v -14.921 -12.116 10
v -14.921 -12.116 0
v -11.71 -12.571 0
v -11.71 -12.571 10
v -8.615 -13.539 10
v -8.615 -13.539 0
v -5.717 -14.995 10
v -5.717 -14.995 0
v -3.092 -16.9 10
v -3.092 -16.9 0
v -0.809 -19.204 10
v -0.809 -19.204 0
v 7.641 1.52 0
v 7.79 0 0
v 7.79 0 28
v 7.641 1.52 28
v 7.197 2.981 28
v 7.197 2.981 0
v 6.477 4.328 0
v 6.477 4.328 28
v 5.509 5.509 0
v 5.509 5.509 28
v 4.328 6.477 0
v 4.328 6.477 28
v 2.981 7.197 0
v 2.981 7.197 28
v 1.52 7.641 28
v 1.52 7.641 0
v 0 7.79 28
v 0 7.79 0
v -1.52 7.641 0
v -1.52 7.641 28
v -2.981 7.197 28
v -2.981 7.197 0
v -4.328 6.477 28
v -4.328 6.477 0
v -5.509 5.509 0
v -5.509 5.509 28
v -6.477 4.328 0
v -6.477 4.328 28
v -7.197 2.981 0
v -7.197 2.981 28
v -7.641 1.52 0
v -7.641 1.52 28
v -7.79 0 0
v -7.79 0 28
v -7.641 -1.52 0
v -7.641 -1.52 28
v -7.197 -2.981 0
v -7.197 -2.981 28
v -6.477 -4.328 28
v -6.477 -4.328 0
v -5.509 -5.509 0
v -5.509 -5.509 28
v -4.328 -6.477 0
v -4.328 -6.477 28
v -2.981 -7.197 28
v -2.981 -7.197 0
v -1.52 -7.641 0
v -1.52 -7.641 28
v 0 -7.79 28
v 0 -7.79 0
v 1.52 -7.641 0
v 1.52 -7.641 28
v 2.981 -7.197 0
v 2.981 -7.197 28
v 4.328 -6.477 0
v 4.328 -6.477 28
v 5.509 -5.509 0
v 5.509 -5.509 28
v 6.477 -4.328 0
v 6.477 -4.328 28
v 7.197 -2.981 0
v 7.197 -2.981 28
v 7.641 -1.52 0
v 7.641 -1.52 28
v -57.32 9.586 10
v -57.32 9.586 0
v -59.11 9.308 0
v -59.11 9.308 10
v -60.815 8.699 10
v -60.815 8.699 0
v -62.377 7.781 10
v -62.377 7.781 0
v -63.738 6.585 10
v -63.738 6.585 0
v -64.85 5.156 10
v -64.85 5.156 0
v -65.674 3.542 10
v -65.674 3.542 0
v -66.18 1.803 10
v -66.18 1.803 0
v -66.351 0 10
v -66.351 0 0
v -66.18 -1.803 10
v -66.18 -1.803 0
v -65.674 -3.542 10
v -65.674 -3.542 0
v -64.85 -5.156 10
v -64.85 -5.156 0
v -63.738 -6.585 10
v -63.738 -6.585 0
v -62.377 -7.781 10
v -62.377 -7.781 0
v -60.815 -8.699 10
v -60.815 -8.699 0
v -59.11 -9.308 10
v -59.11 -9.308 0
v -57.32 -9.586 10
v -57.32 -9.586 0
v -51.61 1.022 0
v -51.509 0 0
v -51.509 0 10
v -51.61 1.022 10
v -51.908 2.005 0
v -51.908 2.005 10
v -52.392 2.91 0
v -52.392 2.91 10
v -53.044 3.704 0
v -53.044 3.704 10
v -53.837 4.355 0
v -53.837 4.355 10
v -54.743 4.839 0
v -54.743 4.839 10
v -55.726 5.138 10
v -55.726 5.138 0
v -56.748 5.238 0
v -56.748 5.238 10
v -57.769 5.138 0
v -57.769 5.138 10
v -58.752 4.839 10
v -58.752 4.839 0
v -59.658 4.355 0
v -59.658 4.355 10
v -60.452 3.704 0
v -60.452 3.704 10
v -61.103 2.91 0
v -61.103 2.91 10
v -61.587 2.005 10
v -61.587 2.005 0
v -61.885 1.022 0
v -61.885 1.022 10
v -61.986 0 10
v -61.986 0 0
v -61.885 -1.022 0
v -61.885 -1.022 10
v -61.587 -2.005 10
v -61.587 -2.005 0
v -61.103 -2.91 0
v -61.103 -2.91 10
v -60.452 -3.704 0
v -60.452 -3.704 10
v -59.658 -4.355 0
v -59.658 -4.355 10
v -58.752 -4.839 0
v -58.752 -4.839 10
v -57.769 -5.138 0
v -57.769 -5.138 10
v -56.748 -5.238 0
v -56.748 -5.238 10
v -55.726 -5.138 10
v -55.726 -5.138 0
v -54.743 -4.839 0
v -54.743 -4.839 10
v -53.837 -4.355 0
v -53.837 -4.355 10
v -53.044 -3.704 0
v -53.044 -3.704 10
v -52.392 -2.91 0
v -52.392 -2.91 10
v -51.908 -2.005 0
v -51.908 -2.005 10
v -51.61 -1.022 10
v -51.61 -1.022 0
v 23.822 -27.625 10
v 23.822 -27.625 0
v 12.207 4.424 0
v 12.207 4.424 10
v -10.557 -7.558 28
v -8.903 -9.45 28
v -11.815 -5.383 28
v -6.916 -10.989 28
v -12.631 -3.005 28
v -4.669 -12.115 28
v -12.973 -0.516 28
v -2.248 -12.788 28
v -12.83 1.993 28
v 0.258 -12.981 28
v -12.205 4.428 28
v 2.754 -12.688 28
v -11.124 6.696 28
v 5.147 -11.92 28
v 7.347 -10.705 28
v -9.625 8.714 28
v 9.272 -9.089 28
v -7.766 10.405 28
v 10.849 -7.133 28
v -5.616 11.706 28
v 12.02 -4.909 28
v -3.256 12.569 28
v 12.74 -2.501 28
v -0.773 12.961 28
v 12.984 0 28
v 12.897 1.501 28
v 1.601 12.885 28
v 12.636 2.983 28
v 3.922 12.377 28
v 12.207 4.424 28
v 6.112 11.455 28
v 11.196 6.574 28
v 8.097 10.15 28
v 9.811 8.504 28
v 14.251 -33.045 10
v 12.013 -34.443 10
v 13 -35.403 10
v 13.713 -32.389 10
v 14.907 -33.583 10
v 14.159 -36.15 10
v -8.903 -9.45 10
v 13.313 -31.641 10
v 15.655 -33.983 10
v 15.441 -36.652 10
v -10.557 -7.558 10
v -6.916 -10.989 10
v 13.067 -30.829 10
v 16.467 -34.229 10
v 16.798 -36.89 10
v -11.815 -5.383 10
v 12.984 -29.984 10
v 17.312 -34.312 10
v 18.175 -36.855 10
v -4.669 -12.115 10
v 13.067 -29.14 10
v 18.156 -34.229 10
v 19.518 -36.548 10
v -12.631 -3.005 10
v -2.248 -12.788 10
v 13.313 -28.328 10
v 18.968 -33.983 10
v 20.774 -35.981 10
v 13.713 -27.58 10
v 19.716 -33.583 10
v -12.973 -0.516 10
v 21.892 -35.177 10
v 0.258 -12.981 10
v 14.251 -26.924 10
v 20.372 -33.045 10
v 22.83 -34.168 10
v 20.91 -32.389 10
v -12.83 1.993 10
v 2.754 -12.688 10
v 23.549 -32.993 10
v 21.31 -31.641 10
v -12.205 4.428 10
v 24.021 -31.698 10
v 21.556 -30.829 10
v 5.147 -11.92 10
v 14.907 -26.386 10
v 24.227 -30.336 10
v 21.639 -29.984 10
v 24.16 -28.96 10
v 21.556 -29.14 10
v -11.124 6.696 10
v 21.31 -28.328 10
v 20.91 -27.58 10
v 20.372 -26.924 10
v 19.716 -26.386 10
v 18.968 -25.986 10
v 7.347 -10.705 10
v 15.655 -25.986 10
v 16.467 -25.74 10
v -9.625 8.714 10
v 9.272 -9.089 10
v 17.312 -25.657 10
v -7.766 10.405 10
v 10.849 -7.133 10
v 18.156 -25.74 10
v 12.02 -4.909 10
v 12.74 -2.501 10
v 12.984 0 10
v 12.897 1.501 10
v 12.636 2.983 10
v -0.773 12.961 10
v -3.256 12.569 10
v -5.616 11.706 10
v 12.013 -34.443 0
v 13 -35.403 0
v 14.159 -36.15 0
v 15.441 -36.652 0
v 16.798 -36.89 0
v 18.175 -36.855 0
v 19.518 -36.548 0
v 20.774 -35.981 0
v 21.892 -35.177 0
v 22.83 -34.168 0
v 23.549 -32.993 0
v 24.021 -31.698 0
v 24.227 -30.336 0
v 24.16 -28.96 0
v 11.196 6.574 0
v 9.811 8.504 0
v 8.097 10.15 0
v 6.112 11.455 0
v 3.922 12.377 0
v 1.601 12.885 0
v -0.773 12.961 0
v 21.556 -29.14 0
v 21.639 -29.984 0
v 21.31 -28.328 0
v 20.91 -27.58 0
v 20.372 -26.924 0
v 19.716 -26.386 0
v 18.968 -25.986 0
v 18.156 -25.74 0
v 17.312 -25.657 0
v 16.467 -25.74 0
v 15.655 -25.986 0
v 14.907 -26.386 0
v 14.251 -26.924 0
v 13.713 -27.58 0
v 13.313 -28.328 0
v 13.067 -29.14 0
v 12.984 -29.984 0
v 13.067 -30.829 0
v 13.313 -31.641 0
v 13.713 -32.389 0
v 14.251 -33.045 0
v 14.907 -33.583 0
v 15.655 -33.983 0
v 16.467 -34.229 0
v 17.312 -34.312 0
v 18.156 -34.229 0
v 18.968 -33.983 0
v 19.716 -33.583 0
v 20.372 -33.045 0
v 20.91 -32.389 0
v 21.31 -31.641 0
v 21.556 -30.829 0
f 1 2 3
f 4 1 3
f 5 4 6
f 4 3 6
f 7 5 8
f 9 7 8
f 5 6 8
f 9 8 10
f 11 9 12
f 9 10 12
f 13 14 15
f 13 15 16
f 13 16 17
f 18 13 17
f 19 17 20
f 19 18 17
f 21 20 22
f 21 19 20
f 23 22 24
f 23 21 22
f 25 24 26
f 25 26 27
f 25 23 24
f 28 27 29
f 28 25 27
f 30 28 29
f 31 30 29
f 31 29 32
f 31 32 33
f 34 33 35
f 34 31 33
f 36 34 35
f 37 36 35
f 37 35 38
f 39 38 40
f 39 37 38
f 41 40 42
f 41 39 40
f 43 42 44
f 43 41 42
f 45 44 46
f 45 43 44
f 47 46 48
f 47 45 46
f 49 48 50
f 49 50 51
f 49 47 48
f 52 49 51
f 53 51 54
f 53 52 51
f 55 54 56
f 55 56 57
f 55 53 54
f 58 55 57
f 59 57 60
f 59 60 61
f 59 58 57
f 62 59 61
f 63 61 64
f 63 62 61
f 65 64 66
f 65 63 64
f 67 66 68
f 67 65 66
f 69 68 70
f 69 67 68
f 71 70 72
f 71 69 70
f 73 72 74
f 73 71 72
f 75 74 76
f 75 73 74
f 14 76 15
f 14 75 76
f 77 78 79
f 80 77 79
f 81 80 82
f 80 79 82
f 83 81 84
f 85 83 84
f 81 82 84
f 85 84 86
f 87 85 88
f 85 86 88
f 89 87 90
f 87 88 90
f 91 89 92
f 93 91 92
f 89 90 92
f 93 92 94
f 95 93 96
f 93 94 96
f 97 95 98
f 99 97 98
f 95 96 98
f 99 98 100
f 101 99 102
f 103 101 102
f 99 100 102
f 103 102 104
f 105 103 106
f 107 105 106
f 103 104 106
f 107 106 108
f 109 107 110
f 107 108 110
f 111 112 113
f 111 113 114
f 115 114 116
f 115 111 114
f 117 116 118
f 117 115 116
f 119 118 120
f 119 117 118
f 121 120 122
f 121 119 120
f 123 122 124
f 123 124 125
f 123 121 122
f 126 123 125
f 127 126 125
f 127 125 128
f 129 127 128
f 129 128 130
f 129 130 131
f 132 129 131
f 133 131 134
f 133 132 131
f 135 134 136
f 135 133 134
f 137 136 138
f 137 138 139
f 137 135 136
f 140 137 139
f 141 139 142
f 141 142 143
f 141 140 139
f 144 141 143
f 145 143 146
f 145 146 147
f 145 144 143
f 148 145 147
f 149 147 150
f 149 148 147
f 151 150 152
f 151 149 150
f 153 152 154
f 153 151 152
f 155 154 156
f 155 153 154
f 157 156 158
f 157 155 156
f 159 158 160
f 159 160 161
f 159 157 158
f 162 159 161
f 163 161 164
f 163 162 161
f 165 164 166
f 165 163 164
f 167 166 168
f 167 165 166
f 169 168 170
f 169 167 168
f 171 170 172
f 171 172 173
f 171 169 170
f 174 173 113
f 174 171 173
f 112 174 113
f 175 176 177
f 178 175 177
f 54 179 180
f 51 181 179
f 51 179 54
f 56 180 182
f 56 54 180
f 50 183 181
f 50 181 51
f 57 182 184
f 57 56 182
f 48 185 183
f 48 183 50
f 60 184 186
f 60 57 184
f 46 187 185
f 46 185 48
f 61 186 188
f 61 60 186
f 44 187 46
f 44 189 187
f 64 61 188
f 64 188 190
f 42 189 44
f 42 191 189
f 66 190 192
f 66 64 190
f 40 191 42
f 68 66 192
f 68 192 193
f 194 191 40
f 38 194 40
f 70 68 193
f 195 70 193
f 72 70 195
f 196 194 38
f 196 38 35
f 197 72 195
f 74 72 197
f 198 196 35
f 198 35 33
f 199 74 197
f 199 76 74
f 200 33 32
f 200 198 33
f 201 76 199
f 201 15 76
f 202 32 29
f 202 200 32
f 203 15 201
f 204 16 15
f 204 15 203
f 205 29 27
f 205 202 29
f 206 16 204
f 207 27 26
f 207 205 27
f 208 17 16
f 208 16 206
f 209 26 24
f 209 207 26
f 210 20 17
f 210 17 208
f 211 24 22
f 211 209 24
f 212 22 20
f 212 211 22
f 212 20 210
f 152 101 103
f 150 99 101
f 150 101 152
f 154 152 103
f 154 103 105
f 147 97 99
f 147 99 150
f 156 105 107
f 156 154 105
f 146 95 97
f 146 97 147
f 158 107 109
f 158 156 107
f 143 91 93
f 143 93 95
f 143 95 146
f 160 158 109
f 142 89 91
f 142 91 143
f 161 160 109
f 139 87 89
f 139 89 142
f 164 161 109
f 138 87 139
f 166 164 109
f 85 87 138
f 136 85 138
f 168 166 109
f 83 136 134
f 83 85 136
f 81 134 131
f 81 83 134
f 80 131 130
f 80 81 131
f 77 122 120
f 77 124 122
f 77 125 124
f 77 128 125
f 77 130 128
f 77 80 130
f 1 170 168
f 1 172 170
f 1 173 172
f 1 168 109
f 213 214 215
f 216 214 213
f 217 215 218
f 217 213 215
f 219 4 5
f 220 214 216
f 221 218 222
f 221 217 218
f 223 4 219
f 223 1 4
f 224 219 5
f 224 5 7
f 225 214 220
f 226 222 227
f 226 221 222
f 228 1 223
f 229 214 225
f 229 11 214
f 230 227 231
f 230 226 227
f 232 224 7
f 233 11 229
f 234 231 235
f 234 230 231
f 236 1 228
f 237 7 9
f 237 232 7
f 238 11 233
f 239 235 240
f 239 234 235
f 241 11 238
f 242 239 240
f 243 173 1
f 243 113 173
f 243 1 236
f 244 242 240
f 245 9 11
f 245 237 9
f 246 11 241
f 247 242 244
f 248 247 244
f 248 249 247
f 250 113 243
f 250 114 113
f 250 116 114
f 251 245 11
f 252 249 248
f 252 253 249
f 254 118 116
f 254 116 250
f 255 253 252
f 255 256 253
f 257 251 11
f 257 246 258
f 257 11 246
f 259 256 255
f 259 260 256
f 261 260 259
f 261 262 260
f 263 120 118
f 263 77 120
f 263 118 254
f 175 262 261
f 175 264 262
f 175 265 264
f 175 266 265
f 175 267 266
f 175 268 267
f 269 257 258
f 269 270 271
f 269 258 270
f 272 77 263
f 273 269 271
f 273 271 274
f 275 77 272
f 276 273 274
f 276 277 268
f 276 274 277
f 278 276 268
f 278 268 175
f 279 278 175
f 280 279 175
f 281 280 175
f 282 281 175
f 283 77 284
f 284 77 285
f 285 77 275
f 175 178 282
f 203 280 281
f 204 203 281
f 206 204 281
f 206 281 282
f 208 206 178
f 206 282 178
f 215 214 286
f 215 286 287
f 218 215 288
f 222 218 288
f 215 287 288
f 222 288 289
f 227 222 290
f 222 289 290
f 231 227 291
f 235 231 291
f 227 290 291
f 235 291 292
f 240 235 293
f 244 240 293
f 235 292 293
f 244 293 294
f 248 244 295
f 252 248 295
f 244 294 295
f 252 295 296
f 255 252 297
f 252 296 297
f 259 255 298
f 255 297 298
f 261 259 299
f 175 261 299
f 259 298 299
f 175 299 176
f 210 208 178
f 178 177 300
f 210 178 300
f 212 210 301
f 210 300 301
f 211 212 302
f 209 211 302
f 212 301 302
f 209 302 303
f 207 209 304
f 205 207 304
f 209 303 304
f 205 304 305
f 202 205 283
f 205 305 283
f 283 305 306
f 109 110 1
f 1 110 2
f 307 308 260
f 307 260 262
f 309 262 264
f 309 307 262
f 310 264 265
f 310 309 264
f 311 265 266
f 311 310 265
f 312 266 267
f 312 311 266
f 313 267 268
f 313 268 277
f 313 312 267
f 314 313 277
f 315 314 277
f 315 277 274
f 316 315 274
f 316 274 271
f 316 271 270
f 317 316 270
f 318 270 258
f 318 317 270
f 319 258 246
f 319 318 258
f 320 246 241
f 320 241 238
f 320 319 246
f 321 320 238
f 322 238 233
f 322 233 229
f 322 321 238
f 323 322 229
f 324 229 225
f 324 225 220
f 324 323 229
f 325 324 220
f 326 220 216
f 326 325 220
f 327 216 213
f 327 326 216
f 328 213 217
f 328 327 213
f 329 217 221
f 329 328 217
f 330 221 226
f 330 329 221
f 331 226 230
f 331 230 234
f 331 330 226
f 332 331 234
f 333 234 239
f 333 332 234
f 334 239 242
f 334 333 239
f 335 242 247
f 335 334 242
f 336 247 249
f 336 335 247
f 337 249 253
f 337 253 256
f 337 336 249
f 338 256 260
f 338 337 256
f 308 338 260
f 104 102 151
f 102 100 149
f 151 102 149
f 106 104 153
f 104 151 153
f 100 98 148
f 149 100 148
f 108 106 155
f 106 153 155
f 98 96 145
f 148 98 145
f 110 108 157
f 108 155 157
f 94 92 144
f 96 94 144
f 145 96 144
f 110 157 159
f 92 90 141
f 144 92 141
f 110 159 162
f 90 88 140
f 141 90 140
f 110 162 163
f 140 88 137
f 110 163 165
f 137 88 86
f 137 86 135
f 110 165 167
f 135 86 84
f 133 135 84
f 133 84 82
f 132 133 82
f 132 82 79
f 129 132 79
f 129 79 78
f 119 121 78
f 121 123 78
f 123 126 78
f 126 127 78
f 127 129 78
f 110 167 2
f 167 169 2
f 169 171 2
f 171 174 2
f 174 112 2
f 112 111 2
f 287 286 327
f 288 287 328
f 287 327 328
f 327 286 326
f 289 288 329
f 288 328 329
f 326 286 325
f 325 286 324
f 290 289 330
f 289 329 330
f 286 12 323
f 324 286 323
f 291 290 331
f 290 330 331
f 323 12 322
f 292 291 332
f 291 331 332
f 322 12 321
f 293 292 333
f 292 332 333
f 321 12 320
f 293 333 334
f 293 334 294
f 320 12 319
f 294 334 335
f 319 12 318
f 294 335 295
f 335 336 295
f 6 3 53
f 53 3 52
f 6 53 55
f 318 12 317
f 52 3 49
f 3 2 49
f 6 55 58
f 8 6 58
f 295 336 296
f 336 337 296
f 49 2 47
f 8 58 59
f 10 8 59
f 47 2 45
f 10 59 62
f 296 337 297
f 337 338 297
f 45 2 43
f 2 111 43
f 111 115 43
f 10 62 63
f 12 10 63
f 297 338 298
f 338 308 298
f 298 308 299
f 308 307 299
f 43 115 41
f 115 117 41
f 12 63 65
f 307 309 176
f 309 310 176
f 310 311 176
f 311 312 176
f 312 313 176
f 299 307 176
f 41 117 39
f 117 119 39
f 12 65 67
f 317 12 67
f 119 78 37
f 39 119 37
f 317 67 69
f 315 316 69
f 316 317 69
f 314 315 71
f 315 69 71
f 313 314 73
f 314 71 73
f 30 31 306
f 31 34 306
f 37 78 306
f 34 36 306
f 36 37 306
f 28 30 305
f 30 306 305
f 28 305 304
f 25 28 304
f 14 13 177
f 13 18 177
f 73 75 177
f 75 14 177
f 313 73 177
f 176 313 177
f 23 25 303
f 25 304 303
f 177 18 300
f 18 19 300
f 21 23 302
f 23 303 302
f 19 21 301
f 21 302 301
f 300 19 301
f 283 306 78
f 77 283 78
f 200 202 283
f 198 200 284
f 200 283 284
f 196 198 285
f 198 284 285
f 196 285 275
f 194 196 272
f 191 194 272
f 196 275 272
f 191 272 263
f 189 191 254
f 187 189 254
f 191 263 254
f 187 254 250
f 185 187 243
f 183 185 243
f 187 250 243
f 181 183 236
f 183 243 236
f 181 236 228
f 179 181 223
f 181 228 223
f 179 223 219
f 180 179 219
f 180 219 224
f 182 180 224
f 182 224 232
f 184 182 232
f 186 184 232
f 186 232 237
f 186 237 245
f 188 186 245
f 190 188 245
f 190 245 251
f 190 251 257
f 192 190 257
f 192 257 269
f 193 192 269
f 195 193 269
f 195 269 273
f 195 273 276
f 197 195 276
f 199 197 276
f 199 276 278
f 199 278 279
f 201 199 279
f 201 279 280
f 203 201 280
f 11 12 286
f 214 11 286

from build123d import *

# Parameters (mm, degrees)
F0_R     = 7.790198
F1_DEPTH = 28
F0_R_2   = 4.327888
F0_R_3   = 5.238237
F2_DEPTH = 10


with BuildPart() as f1:
    # F0 (on Top) → F1 (new body)
    with BuildSketch(Plane.XY):
        with BuildLine():
            ThreePointArc((-0.773386, 12.96061), (-8.903206, -9.450315), (12.983664, 0))
            ThreePointArc((12.983664, 0), (12.787958, 2.245812), (12.206738, 4.423921))
            ThreePointArc((12.206738, 4.423921), (7.134364, 10.847875), (-0.773386, 12.96061))
        make_face()
        Circle(F0_R, mode=Mode.SUBTRACT)
    extrude(amount=F1_DEPTH)

    # F0 (on Top) → F2 (join)
    with BuildSketch(Plane.XY):
        with BuildLine():
            ThreePointArc((12.206738, 4.423921), (12.787958, 2.245812), (12.983664, 0))
            ThreePointArc((12.983664, 0), (-8.903206, -9.450315), (-0.773386, 12.96061))
            Line((-0.773386, 12.96061), (-57.319608, 9.586383))
            ThreePointArc((-57.319608, 9.586383), (-66.351004, 0), (-57.319608, -9.586383))
            Line((-57.319608, -9.586383), (-14.921315, -12.116374))
            ThreePointArc((-14.921315, -12.116374), (-7.136198, -14.208437), (-0.80941, -19.204088))
            Line((-0.80941, -19.204088), (12.0131, -34.442827))
            ThreePointArc((12.0131, -34.442827), (20.773863, -35.981386), (23.821813, -27.625063))
            Line((23.821813, -27.625063), (12.206738, 4.423921))
        make_face()
        with Locations((17.311552, -29.984488)):
            Circle(F0_R_2, mode=Mode.SUBTRACT)
        with Locations((-56.74757, 0)):
            Circle(F0_R_3, mode=Mode.SUBTRACT)
    extrude(amount=F2_DEPTH)


solid = f1.part
